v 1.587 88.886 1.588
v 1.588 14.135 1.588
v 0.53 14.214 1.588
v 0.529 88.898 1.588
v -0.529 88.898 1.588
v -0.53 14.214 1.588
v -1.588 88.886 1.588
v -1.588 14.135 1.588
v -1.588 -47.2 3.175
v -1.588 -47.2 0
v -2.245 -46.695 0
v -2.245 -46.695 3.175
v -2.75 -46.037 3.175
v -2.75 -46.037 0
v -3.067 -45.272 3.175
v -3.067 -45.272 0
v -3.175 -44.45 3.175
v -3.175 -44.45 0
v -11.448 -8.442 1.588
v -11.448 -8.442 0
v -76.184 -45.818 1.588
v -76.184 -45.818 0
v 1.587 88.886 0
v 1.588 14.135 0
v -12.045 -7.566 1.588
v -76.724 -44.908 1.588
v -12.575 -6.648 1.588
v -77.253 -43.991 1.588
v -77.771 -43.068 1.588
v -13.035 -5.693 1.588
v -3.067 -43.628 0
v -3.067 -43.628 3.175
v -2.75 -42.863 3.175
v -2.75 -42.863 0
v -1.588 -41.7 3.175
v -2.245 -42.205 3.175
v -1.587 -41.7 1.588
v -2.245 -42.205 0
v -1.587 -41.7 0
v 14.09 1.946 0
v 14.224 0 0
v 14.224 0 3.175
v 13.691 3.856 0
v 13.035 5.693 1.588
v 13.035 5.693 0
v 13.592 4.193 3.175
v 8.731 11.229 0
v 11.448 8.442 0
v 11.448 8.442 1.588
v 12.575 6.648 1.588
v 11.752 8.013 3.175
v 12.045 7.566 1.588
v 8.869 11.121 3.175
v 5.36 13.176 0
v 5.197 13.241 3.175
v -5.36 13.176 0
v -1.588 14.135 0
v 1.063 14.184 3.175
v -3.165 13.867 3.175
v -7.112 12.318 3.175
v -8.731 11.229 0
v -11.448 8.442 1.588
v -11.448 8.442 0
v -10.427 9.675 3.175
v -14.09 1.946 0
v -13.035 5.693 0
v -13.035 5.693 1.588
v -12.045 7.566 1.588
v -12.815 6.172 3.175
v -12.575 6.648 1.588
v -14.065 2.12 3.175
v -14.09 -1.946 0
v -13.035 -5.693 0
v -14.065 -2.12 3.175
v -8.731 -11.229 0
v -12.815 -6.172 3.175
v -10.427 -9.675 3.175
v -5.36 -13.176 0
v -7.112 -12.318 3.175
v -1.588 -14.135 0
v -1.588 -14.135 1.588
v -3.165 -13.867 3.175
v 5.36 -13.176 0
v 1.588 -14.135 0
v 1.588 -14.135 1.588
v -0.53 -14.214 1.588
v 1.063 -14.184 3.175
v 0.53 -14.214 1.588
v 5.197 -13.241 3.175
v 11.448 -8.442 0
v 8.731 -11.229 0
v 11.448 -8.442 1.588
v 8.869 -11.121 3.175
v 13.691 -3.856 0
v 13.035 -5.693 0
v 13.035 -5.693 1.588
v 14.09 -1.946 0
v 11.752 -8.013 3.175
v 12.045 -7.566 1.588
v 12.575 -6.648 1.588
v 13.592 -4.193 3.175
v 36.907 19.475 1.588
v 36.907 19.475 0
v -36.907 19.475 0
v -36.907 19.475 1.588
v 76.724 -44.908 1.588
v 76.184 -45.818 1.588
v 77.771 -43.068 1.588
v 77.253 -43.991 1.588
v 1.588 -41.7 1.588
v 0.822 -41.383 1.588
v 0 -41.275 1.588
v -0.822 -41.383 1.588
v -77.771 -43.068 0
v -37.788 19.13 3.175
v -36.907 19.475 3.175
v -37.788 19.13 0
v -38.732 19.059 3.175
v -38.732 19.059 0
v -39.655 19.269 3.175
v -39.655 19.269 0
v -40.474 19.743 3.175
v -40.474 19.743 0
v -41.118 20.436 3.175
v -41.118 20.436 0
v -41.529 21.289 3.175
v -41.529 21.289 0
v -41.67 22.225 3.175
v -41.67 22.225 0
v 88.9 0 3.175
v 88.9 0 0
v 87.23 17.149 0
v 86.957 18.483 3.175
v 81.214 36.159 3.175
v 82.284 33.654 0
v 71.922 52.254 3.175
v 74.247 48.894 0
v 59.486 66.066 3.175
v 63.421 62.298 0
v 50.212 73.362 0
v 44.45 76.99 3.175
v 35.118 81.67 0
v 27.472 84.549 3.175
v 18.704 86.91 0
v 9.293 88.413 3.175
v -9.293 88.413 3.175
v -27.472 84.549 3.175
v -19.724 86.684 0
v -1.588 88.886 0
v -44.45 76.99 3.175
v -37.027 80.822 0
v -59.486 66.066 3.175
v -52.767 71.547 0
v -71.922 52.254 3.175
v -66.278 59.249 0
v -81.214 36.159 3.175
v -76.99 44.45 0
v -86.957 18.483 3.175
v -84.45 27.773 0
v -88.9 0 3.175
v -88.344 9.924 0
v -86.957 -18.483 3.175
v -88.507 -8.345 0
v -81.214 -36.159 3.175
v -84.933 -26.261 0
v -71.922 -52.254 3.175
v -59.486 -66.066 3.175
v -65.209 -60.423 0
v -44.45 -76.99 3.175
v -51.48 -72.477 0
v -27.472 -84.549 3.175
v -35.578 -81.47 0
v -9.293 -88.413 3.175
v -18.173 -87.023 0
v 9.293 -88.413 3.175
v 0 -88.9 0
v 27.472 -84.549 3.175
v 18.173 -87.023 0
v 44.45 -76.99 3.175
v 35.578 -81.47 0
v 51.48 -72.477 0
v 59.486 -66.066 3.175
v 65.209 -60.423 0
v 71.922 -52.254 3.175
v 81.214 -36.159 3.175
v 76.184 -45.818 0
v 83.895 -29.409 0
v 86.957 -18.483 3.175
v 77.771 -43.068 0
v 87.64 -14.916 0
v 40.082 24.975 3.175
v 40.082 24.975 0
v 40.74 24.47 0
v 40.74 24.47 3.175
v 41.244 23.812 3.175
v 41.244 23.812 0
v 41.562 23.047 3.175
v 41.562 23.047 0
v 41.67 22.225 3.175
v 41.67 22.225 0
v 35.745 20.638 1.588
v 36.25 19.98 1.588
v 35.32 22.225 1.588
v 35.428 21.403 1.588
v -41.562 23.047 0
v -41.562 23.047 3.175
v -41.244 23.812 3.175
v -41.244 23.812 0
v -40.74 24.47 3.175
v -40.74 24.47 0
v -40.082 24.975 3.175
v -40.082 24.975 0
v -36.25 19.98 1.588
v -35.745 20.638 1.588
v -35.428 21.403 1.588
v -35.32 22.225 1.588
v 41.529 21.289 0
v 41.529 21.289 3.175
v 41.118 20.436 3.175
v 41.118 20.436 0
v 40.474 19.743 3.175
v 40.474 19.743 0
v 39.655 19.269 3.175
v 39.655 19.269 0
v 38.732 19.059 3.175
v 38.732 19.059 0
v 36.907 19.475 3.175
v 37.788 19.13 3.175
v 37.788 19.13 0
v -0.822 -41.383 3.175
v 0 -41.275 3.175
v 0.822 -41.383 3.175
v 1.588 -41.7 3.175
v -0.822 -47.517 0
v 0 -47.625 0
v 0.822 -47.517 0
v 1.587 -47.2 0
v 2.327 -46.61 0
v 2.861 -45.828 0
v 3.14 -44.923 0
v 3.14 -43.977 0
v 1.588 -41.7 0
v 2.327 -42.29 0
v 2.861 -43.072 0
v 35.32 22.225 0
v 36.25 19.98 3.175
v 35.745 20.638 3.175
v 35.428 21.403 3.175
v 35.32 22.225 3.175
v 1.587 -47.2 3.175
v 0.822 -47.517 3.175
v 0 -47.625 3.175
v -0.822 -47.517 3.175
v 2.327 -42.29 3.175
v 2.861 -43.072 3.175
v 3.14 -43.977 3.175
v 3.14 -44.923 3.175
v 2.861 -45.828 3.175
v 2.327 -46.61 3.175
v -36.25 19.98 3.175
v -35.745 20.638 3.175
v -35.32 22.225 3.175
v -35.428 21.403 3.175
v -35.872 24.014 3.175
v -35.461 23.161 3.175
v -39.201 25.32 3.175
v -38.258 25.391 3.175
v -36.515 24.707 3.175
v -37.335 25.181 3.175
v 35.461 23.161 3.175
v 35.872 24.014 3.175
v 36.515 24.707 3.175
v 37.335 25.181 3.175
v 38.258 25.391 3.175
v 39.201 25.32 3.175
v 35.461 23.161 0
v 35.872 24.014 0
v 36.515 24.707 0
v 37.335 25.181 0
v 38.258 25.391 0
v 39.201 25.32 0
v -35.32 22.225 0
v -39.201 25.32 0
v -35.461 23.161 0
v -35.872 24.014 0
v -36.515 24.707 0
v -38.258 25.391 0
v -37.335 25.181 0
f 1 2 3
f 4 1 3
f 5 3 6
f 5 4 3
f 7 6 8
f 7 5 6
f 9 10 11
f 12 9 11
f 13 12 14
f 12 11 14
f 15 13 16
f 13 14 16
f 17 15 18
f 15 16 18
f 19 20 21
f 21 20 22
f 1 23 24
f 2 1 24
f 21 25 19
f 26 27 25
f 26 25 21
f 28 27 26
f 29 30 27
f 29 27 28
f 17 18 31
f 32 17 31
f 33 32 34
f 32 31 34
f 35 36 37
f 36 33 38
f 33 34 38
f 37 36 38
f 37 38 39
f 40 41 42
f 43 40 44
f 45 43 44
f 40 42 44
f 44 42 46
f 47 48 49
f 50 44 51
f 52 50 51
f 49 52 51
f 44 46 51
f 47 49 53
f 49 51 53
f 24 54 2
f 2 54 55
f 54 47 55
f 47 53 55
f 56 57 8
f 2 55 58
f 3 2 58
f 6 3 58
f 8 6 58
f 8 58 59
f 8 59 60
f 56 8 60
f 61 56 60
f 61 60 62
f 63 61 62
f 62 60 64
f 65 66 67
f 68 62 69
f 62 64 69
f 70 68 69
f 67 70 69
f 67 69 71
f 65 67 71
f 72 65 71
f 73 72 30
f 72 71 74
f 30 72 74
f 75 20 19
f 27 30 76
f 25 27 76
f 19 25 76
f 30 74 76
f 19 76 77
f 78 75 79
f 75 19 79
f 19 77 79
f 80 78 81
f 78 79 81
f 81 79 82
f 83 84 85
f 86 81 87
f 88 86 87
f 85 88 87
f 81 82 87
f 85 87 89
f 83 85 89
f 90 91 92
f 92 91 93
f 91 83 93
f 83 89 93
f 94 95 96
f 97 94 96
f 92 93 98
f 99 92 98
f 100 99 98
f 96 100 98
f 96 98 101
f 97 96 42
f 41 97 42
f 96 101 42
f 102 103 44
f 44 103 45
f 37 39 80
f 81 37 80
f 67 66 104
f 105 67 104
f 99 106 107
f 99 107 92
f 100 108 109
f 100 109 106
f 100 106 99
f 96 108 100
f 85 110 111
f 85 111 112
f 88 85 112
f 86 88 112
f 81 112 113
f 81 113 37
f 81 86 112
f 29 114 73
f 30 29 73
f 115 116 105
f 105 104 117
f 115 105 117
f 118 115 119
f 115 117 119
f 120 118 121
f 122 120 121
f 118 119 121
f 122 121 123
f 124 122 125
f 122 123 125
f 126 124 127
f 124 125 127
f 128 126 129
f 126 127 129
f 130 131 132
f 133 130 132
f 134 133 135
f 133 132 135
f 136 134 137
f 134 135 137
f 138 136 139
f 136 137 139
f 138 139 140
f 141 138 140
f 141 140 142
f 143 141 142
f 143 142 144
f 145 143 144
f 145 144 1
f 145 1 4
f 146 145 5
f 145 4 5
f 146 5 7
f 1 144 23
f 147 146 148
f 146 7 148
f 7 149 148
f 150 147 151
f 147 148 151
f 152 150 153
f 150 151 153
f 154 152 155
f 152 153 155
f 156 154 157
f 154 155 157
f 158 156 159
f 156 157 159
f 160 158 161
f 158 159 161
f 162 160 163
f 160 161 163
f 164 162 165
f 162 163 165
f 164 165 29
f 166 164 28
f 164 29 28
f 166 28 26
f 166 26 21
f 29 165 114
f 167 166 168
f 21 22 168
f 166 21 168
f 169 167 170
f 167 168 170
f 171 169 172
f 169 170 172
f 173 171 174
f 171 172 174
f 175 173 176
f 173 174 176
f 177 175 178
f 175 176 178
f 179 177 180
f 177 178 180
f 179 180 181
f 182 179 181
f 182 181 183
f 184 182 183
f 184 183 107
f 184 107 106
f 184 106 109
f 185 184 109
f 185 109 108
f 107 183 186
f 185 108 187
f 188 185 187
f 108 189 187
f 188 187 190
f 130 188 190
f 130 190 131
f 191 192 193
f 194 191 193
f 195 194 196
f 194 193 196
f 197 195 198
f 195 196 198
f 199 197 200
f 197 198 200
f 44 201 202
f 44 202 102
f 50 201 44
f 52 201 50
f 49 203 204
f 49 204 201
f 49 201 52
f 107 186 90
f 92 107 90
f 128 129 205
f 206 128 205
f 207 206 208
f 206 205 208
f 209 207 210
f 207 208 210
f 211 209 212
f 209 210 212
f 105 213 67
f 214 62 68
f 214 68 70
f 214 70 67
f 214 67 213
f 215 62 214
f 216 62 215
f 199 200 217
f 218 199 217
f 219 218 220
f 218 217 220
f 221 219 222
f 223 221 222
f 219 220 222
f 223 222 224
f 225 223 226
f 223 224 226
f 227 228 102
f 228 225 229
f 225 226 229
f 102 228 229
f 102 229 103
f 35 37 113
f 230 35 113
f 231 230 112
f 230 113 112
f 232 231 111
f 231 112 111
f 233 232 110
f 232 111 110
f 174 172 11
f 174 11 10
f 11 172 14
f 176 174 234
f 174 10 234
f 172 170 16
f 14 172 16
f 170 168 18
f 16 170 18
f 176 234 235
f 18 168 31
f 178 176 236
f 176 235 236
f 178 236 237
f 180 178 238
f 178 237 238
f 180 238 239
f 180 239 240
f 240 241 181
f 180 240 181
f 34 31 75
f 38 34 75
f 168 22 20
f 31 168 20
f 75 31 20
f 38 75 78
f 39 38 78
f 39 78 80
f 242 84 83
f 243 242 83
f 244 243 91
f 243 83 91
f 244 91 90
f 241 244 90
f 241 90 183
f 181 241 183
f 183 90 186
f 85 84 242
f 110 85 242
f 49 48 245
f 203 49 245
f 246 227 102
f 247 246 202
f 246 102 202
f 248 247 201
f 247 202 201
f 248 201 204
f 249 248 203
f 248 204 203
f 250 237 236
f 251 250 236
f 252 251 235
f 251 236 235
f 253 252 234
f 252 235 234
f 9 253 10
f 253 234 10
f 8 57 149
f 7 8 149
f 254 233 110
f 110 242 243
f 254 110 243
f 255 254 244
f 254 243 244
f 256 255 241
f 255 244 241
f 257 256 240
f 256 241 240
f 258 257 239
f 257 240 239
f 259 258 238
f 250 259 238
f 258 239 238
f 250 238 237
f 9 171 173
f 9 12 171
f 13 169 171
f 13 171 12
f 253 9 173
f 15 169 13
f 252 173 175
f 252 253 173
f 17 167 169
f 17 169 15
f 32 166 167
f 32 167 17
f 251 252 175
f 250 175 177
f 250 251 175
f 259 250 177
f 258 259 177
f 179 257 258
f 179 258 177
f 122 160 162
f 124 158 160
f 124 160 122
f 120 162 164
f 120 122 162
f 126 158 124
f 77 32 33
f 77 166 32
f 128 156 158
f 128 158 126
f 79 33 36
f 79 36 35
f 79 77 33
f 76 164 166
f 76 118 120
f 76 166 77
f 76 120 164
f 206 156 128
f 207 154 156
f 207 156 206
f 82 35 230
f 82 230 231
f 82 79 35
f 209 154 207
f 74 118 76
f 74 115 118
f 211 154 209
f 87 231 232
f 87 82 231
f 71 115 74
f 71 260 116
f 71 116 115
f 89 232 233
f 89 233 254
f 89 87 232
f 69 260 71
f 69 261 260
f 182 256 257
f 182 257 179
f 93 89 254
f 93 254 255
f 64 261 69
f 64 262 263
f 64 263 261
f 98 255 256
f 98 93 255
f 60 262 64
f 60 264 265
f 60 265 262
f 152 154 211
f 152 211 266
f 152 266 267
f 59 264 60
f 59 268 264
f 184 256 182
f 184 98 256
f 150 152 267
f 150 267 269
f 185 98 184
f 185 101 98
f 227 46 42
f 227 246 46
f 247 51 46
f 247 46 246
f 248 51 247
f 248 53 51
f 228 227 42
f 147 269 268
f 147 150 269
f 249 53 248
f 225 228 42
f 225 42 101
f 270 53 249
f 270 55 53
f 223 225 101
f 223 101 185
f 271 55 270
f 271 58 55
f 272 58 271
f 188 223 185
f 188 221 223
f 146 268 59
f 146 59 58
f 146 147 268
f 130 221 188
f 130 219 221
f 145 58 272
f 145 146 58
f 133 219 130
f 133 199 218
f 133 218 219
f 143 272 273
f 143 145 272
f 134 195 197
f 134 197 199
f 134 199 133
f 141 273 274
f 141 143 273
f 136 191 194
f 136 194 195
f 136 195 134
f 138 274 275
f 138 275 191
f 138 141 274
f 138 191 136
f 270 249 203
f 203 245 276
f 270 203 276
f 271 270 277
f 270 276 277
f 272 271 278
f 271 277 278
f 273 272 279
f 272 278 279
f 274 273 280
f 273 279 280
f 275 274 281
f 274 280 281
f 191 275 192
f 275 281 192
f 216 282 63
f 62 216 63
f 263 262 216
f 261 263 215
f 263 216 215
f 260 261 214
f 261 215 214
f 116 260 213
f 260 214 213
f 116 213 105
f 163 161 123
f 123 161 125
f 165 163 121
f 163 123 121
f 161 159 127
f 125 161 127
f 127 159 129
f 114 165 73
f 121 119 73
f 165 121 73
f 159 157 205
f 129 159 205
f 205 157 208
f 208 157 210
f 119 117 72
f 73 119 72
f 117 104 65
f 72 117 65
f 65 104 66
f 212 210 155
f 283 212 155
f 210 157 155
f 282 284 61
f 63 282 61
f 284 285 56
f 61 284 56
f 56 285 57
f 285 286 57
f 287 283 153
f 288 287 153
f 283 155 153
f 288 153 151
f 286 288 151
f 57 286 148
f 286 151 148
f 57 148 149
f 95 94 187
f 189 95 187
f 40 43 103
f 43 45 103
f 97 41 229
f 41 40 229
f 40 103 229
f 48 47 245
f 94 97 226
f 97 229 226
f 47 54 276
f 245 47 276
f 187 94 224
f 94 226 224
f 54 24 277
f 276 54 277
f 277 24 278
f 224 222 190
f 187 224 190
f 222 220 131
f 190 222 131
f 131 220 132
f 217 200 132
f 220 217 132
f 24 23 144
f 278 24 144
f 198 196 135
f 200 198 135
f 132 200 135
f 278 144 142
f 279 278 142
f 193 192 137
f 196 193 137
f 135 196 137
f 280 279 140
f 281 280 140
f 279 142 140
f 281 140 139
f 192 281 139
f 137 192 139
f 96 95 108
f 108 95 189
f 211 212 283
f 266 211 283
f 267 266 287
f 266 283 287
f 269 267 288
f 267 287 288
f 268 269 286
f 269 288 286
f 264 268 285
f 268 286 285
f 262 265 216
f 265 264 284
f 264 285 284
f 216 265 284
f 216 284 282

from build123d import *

# Parameters (mm, degrees)
SKETCH1_R           = 88.9
BOSS_EXTRUDE1_DEPTH = 3.175
CUT_EXTRUDE3_DEPTH  = 1.5875
SKETCH3_R           = 14.224
CUT_EXTRUDE4_DEPTH  = 126.763669734
SKETCH2_4_R         = 3.175
CUT_EXTRUDE5_DEPTH  = 126.763669734


with BuildPart() as part:
    # Sketch1 → Boss-Extrude1 (new body)
    with BuildSketch(Plane.XY):
        Circle(SKETCH1_R)
    extrude(amount=BOSS_EXTRUDE1_DEPTH)

    # Sketch2 → Cut-Extrude3 (cut)
    with BuildSketch(Plane(origin=(0, 0, 0), x_dir=(-1, 0, 0), z_dir=(0, 0, -1))):
        with BuildLine():
            ThreePointArc((-77.771132281, -43.068097053), (-76.989658396, -44.45), (-76.183632281, -45.81772771))
            Line((-76.183632281, -45.81772771), (-1.5875, -2.749630657))
            Line((-1.5875, -2.749630657), (-1.5875, -41.700369343))
            ThreePointArc((-1.5875, -41.700369343), (0, -41.275), (1.5875, -41.700369343))
            Line((1.5875, -41.700369343), (1.5875, -2.749630657))
            Line((1.5875, -2.749630657), (76.183632281, -45.81772771))
            ThreePointArc((76.183632281, -45.81772771), (76.989658396, -44.45), (77.771132281, -43.068097053))
            Line((77.771132281, -43.068097053), (3.175, 0))
            Line((3.175, 0), (36.907329198, 19.475369343))
            ThreePointArc((36.907329198, 19.475369343), (35.745198541, 20.6375), (35.319829198, 22.225))
            Line((35.319829198, 22.225), (1.5875, 2.749630657))
            Line((1.5875, 2.749630657), (1.5875, 88.885824763))
            ThreePointArc((1.5875, 88.885824763), (0, 88.9), (-1.5875, 88.885824763))
            Line((-1.5875, 88.885824763), (-1.5875, 2.749630657))
            Line((-1.5875, 2.749630657), (-35.319829198, 22.225))
            ThreePointArc((-35.319829198, 22.225), (-35.745198541, 20.6375), (-36.907329198, 19.475369343))
            Line((-36.907329198, 19.475369343), (-3.175, 0))
            Line((-3.175, 0), (-77.771132281, -43.068097053))
        make_face()
    extrude(amount=-CUT_EXTRUDE3_DEPTH, mode=Mode.SUBTRACT)

    # Sketch3 → Cut-Extrude4 (cut, through all)
    with BuildSketch(Plane.XY.offset(3.175)):
        Circle(SKETCH3_R)
    extrude(amount=-CUT_EXTRUDE4_DEPTH, mode=Mode.SUBTRACT)

    # Sketch2<4> → Cut-Extrude5 (cut, through all)
    with BuildSketch(Plane(origin=(0, 0, 0), x_dir=(-1, 0, 0), z_dir=(0, 0, -1))):
        with Locations((0, -44.45)):
            Circle(SKETCH2_4_R)
        with Locations((-38.494829198, 22.225)):
            Circle(SKETCH2_4_R)
        with Locations((38.494829198, 22.225)):
            Circle(SKETCH2_4_R)
    extrude(amount=-CUT_EXTRUDE5_DEPTH, mode=Mode.SUBTRACT)


solid = part.part
